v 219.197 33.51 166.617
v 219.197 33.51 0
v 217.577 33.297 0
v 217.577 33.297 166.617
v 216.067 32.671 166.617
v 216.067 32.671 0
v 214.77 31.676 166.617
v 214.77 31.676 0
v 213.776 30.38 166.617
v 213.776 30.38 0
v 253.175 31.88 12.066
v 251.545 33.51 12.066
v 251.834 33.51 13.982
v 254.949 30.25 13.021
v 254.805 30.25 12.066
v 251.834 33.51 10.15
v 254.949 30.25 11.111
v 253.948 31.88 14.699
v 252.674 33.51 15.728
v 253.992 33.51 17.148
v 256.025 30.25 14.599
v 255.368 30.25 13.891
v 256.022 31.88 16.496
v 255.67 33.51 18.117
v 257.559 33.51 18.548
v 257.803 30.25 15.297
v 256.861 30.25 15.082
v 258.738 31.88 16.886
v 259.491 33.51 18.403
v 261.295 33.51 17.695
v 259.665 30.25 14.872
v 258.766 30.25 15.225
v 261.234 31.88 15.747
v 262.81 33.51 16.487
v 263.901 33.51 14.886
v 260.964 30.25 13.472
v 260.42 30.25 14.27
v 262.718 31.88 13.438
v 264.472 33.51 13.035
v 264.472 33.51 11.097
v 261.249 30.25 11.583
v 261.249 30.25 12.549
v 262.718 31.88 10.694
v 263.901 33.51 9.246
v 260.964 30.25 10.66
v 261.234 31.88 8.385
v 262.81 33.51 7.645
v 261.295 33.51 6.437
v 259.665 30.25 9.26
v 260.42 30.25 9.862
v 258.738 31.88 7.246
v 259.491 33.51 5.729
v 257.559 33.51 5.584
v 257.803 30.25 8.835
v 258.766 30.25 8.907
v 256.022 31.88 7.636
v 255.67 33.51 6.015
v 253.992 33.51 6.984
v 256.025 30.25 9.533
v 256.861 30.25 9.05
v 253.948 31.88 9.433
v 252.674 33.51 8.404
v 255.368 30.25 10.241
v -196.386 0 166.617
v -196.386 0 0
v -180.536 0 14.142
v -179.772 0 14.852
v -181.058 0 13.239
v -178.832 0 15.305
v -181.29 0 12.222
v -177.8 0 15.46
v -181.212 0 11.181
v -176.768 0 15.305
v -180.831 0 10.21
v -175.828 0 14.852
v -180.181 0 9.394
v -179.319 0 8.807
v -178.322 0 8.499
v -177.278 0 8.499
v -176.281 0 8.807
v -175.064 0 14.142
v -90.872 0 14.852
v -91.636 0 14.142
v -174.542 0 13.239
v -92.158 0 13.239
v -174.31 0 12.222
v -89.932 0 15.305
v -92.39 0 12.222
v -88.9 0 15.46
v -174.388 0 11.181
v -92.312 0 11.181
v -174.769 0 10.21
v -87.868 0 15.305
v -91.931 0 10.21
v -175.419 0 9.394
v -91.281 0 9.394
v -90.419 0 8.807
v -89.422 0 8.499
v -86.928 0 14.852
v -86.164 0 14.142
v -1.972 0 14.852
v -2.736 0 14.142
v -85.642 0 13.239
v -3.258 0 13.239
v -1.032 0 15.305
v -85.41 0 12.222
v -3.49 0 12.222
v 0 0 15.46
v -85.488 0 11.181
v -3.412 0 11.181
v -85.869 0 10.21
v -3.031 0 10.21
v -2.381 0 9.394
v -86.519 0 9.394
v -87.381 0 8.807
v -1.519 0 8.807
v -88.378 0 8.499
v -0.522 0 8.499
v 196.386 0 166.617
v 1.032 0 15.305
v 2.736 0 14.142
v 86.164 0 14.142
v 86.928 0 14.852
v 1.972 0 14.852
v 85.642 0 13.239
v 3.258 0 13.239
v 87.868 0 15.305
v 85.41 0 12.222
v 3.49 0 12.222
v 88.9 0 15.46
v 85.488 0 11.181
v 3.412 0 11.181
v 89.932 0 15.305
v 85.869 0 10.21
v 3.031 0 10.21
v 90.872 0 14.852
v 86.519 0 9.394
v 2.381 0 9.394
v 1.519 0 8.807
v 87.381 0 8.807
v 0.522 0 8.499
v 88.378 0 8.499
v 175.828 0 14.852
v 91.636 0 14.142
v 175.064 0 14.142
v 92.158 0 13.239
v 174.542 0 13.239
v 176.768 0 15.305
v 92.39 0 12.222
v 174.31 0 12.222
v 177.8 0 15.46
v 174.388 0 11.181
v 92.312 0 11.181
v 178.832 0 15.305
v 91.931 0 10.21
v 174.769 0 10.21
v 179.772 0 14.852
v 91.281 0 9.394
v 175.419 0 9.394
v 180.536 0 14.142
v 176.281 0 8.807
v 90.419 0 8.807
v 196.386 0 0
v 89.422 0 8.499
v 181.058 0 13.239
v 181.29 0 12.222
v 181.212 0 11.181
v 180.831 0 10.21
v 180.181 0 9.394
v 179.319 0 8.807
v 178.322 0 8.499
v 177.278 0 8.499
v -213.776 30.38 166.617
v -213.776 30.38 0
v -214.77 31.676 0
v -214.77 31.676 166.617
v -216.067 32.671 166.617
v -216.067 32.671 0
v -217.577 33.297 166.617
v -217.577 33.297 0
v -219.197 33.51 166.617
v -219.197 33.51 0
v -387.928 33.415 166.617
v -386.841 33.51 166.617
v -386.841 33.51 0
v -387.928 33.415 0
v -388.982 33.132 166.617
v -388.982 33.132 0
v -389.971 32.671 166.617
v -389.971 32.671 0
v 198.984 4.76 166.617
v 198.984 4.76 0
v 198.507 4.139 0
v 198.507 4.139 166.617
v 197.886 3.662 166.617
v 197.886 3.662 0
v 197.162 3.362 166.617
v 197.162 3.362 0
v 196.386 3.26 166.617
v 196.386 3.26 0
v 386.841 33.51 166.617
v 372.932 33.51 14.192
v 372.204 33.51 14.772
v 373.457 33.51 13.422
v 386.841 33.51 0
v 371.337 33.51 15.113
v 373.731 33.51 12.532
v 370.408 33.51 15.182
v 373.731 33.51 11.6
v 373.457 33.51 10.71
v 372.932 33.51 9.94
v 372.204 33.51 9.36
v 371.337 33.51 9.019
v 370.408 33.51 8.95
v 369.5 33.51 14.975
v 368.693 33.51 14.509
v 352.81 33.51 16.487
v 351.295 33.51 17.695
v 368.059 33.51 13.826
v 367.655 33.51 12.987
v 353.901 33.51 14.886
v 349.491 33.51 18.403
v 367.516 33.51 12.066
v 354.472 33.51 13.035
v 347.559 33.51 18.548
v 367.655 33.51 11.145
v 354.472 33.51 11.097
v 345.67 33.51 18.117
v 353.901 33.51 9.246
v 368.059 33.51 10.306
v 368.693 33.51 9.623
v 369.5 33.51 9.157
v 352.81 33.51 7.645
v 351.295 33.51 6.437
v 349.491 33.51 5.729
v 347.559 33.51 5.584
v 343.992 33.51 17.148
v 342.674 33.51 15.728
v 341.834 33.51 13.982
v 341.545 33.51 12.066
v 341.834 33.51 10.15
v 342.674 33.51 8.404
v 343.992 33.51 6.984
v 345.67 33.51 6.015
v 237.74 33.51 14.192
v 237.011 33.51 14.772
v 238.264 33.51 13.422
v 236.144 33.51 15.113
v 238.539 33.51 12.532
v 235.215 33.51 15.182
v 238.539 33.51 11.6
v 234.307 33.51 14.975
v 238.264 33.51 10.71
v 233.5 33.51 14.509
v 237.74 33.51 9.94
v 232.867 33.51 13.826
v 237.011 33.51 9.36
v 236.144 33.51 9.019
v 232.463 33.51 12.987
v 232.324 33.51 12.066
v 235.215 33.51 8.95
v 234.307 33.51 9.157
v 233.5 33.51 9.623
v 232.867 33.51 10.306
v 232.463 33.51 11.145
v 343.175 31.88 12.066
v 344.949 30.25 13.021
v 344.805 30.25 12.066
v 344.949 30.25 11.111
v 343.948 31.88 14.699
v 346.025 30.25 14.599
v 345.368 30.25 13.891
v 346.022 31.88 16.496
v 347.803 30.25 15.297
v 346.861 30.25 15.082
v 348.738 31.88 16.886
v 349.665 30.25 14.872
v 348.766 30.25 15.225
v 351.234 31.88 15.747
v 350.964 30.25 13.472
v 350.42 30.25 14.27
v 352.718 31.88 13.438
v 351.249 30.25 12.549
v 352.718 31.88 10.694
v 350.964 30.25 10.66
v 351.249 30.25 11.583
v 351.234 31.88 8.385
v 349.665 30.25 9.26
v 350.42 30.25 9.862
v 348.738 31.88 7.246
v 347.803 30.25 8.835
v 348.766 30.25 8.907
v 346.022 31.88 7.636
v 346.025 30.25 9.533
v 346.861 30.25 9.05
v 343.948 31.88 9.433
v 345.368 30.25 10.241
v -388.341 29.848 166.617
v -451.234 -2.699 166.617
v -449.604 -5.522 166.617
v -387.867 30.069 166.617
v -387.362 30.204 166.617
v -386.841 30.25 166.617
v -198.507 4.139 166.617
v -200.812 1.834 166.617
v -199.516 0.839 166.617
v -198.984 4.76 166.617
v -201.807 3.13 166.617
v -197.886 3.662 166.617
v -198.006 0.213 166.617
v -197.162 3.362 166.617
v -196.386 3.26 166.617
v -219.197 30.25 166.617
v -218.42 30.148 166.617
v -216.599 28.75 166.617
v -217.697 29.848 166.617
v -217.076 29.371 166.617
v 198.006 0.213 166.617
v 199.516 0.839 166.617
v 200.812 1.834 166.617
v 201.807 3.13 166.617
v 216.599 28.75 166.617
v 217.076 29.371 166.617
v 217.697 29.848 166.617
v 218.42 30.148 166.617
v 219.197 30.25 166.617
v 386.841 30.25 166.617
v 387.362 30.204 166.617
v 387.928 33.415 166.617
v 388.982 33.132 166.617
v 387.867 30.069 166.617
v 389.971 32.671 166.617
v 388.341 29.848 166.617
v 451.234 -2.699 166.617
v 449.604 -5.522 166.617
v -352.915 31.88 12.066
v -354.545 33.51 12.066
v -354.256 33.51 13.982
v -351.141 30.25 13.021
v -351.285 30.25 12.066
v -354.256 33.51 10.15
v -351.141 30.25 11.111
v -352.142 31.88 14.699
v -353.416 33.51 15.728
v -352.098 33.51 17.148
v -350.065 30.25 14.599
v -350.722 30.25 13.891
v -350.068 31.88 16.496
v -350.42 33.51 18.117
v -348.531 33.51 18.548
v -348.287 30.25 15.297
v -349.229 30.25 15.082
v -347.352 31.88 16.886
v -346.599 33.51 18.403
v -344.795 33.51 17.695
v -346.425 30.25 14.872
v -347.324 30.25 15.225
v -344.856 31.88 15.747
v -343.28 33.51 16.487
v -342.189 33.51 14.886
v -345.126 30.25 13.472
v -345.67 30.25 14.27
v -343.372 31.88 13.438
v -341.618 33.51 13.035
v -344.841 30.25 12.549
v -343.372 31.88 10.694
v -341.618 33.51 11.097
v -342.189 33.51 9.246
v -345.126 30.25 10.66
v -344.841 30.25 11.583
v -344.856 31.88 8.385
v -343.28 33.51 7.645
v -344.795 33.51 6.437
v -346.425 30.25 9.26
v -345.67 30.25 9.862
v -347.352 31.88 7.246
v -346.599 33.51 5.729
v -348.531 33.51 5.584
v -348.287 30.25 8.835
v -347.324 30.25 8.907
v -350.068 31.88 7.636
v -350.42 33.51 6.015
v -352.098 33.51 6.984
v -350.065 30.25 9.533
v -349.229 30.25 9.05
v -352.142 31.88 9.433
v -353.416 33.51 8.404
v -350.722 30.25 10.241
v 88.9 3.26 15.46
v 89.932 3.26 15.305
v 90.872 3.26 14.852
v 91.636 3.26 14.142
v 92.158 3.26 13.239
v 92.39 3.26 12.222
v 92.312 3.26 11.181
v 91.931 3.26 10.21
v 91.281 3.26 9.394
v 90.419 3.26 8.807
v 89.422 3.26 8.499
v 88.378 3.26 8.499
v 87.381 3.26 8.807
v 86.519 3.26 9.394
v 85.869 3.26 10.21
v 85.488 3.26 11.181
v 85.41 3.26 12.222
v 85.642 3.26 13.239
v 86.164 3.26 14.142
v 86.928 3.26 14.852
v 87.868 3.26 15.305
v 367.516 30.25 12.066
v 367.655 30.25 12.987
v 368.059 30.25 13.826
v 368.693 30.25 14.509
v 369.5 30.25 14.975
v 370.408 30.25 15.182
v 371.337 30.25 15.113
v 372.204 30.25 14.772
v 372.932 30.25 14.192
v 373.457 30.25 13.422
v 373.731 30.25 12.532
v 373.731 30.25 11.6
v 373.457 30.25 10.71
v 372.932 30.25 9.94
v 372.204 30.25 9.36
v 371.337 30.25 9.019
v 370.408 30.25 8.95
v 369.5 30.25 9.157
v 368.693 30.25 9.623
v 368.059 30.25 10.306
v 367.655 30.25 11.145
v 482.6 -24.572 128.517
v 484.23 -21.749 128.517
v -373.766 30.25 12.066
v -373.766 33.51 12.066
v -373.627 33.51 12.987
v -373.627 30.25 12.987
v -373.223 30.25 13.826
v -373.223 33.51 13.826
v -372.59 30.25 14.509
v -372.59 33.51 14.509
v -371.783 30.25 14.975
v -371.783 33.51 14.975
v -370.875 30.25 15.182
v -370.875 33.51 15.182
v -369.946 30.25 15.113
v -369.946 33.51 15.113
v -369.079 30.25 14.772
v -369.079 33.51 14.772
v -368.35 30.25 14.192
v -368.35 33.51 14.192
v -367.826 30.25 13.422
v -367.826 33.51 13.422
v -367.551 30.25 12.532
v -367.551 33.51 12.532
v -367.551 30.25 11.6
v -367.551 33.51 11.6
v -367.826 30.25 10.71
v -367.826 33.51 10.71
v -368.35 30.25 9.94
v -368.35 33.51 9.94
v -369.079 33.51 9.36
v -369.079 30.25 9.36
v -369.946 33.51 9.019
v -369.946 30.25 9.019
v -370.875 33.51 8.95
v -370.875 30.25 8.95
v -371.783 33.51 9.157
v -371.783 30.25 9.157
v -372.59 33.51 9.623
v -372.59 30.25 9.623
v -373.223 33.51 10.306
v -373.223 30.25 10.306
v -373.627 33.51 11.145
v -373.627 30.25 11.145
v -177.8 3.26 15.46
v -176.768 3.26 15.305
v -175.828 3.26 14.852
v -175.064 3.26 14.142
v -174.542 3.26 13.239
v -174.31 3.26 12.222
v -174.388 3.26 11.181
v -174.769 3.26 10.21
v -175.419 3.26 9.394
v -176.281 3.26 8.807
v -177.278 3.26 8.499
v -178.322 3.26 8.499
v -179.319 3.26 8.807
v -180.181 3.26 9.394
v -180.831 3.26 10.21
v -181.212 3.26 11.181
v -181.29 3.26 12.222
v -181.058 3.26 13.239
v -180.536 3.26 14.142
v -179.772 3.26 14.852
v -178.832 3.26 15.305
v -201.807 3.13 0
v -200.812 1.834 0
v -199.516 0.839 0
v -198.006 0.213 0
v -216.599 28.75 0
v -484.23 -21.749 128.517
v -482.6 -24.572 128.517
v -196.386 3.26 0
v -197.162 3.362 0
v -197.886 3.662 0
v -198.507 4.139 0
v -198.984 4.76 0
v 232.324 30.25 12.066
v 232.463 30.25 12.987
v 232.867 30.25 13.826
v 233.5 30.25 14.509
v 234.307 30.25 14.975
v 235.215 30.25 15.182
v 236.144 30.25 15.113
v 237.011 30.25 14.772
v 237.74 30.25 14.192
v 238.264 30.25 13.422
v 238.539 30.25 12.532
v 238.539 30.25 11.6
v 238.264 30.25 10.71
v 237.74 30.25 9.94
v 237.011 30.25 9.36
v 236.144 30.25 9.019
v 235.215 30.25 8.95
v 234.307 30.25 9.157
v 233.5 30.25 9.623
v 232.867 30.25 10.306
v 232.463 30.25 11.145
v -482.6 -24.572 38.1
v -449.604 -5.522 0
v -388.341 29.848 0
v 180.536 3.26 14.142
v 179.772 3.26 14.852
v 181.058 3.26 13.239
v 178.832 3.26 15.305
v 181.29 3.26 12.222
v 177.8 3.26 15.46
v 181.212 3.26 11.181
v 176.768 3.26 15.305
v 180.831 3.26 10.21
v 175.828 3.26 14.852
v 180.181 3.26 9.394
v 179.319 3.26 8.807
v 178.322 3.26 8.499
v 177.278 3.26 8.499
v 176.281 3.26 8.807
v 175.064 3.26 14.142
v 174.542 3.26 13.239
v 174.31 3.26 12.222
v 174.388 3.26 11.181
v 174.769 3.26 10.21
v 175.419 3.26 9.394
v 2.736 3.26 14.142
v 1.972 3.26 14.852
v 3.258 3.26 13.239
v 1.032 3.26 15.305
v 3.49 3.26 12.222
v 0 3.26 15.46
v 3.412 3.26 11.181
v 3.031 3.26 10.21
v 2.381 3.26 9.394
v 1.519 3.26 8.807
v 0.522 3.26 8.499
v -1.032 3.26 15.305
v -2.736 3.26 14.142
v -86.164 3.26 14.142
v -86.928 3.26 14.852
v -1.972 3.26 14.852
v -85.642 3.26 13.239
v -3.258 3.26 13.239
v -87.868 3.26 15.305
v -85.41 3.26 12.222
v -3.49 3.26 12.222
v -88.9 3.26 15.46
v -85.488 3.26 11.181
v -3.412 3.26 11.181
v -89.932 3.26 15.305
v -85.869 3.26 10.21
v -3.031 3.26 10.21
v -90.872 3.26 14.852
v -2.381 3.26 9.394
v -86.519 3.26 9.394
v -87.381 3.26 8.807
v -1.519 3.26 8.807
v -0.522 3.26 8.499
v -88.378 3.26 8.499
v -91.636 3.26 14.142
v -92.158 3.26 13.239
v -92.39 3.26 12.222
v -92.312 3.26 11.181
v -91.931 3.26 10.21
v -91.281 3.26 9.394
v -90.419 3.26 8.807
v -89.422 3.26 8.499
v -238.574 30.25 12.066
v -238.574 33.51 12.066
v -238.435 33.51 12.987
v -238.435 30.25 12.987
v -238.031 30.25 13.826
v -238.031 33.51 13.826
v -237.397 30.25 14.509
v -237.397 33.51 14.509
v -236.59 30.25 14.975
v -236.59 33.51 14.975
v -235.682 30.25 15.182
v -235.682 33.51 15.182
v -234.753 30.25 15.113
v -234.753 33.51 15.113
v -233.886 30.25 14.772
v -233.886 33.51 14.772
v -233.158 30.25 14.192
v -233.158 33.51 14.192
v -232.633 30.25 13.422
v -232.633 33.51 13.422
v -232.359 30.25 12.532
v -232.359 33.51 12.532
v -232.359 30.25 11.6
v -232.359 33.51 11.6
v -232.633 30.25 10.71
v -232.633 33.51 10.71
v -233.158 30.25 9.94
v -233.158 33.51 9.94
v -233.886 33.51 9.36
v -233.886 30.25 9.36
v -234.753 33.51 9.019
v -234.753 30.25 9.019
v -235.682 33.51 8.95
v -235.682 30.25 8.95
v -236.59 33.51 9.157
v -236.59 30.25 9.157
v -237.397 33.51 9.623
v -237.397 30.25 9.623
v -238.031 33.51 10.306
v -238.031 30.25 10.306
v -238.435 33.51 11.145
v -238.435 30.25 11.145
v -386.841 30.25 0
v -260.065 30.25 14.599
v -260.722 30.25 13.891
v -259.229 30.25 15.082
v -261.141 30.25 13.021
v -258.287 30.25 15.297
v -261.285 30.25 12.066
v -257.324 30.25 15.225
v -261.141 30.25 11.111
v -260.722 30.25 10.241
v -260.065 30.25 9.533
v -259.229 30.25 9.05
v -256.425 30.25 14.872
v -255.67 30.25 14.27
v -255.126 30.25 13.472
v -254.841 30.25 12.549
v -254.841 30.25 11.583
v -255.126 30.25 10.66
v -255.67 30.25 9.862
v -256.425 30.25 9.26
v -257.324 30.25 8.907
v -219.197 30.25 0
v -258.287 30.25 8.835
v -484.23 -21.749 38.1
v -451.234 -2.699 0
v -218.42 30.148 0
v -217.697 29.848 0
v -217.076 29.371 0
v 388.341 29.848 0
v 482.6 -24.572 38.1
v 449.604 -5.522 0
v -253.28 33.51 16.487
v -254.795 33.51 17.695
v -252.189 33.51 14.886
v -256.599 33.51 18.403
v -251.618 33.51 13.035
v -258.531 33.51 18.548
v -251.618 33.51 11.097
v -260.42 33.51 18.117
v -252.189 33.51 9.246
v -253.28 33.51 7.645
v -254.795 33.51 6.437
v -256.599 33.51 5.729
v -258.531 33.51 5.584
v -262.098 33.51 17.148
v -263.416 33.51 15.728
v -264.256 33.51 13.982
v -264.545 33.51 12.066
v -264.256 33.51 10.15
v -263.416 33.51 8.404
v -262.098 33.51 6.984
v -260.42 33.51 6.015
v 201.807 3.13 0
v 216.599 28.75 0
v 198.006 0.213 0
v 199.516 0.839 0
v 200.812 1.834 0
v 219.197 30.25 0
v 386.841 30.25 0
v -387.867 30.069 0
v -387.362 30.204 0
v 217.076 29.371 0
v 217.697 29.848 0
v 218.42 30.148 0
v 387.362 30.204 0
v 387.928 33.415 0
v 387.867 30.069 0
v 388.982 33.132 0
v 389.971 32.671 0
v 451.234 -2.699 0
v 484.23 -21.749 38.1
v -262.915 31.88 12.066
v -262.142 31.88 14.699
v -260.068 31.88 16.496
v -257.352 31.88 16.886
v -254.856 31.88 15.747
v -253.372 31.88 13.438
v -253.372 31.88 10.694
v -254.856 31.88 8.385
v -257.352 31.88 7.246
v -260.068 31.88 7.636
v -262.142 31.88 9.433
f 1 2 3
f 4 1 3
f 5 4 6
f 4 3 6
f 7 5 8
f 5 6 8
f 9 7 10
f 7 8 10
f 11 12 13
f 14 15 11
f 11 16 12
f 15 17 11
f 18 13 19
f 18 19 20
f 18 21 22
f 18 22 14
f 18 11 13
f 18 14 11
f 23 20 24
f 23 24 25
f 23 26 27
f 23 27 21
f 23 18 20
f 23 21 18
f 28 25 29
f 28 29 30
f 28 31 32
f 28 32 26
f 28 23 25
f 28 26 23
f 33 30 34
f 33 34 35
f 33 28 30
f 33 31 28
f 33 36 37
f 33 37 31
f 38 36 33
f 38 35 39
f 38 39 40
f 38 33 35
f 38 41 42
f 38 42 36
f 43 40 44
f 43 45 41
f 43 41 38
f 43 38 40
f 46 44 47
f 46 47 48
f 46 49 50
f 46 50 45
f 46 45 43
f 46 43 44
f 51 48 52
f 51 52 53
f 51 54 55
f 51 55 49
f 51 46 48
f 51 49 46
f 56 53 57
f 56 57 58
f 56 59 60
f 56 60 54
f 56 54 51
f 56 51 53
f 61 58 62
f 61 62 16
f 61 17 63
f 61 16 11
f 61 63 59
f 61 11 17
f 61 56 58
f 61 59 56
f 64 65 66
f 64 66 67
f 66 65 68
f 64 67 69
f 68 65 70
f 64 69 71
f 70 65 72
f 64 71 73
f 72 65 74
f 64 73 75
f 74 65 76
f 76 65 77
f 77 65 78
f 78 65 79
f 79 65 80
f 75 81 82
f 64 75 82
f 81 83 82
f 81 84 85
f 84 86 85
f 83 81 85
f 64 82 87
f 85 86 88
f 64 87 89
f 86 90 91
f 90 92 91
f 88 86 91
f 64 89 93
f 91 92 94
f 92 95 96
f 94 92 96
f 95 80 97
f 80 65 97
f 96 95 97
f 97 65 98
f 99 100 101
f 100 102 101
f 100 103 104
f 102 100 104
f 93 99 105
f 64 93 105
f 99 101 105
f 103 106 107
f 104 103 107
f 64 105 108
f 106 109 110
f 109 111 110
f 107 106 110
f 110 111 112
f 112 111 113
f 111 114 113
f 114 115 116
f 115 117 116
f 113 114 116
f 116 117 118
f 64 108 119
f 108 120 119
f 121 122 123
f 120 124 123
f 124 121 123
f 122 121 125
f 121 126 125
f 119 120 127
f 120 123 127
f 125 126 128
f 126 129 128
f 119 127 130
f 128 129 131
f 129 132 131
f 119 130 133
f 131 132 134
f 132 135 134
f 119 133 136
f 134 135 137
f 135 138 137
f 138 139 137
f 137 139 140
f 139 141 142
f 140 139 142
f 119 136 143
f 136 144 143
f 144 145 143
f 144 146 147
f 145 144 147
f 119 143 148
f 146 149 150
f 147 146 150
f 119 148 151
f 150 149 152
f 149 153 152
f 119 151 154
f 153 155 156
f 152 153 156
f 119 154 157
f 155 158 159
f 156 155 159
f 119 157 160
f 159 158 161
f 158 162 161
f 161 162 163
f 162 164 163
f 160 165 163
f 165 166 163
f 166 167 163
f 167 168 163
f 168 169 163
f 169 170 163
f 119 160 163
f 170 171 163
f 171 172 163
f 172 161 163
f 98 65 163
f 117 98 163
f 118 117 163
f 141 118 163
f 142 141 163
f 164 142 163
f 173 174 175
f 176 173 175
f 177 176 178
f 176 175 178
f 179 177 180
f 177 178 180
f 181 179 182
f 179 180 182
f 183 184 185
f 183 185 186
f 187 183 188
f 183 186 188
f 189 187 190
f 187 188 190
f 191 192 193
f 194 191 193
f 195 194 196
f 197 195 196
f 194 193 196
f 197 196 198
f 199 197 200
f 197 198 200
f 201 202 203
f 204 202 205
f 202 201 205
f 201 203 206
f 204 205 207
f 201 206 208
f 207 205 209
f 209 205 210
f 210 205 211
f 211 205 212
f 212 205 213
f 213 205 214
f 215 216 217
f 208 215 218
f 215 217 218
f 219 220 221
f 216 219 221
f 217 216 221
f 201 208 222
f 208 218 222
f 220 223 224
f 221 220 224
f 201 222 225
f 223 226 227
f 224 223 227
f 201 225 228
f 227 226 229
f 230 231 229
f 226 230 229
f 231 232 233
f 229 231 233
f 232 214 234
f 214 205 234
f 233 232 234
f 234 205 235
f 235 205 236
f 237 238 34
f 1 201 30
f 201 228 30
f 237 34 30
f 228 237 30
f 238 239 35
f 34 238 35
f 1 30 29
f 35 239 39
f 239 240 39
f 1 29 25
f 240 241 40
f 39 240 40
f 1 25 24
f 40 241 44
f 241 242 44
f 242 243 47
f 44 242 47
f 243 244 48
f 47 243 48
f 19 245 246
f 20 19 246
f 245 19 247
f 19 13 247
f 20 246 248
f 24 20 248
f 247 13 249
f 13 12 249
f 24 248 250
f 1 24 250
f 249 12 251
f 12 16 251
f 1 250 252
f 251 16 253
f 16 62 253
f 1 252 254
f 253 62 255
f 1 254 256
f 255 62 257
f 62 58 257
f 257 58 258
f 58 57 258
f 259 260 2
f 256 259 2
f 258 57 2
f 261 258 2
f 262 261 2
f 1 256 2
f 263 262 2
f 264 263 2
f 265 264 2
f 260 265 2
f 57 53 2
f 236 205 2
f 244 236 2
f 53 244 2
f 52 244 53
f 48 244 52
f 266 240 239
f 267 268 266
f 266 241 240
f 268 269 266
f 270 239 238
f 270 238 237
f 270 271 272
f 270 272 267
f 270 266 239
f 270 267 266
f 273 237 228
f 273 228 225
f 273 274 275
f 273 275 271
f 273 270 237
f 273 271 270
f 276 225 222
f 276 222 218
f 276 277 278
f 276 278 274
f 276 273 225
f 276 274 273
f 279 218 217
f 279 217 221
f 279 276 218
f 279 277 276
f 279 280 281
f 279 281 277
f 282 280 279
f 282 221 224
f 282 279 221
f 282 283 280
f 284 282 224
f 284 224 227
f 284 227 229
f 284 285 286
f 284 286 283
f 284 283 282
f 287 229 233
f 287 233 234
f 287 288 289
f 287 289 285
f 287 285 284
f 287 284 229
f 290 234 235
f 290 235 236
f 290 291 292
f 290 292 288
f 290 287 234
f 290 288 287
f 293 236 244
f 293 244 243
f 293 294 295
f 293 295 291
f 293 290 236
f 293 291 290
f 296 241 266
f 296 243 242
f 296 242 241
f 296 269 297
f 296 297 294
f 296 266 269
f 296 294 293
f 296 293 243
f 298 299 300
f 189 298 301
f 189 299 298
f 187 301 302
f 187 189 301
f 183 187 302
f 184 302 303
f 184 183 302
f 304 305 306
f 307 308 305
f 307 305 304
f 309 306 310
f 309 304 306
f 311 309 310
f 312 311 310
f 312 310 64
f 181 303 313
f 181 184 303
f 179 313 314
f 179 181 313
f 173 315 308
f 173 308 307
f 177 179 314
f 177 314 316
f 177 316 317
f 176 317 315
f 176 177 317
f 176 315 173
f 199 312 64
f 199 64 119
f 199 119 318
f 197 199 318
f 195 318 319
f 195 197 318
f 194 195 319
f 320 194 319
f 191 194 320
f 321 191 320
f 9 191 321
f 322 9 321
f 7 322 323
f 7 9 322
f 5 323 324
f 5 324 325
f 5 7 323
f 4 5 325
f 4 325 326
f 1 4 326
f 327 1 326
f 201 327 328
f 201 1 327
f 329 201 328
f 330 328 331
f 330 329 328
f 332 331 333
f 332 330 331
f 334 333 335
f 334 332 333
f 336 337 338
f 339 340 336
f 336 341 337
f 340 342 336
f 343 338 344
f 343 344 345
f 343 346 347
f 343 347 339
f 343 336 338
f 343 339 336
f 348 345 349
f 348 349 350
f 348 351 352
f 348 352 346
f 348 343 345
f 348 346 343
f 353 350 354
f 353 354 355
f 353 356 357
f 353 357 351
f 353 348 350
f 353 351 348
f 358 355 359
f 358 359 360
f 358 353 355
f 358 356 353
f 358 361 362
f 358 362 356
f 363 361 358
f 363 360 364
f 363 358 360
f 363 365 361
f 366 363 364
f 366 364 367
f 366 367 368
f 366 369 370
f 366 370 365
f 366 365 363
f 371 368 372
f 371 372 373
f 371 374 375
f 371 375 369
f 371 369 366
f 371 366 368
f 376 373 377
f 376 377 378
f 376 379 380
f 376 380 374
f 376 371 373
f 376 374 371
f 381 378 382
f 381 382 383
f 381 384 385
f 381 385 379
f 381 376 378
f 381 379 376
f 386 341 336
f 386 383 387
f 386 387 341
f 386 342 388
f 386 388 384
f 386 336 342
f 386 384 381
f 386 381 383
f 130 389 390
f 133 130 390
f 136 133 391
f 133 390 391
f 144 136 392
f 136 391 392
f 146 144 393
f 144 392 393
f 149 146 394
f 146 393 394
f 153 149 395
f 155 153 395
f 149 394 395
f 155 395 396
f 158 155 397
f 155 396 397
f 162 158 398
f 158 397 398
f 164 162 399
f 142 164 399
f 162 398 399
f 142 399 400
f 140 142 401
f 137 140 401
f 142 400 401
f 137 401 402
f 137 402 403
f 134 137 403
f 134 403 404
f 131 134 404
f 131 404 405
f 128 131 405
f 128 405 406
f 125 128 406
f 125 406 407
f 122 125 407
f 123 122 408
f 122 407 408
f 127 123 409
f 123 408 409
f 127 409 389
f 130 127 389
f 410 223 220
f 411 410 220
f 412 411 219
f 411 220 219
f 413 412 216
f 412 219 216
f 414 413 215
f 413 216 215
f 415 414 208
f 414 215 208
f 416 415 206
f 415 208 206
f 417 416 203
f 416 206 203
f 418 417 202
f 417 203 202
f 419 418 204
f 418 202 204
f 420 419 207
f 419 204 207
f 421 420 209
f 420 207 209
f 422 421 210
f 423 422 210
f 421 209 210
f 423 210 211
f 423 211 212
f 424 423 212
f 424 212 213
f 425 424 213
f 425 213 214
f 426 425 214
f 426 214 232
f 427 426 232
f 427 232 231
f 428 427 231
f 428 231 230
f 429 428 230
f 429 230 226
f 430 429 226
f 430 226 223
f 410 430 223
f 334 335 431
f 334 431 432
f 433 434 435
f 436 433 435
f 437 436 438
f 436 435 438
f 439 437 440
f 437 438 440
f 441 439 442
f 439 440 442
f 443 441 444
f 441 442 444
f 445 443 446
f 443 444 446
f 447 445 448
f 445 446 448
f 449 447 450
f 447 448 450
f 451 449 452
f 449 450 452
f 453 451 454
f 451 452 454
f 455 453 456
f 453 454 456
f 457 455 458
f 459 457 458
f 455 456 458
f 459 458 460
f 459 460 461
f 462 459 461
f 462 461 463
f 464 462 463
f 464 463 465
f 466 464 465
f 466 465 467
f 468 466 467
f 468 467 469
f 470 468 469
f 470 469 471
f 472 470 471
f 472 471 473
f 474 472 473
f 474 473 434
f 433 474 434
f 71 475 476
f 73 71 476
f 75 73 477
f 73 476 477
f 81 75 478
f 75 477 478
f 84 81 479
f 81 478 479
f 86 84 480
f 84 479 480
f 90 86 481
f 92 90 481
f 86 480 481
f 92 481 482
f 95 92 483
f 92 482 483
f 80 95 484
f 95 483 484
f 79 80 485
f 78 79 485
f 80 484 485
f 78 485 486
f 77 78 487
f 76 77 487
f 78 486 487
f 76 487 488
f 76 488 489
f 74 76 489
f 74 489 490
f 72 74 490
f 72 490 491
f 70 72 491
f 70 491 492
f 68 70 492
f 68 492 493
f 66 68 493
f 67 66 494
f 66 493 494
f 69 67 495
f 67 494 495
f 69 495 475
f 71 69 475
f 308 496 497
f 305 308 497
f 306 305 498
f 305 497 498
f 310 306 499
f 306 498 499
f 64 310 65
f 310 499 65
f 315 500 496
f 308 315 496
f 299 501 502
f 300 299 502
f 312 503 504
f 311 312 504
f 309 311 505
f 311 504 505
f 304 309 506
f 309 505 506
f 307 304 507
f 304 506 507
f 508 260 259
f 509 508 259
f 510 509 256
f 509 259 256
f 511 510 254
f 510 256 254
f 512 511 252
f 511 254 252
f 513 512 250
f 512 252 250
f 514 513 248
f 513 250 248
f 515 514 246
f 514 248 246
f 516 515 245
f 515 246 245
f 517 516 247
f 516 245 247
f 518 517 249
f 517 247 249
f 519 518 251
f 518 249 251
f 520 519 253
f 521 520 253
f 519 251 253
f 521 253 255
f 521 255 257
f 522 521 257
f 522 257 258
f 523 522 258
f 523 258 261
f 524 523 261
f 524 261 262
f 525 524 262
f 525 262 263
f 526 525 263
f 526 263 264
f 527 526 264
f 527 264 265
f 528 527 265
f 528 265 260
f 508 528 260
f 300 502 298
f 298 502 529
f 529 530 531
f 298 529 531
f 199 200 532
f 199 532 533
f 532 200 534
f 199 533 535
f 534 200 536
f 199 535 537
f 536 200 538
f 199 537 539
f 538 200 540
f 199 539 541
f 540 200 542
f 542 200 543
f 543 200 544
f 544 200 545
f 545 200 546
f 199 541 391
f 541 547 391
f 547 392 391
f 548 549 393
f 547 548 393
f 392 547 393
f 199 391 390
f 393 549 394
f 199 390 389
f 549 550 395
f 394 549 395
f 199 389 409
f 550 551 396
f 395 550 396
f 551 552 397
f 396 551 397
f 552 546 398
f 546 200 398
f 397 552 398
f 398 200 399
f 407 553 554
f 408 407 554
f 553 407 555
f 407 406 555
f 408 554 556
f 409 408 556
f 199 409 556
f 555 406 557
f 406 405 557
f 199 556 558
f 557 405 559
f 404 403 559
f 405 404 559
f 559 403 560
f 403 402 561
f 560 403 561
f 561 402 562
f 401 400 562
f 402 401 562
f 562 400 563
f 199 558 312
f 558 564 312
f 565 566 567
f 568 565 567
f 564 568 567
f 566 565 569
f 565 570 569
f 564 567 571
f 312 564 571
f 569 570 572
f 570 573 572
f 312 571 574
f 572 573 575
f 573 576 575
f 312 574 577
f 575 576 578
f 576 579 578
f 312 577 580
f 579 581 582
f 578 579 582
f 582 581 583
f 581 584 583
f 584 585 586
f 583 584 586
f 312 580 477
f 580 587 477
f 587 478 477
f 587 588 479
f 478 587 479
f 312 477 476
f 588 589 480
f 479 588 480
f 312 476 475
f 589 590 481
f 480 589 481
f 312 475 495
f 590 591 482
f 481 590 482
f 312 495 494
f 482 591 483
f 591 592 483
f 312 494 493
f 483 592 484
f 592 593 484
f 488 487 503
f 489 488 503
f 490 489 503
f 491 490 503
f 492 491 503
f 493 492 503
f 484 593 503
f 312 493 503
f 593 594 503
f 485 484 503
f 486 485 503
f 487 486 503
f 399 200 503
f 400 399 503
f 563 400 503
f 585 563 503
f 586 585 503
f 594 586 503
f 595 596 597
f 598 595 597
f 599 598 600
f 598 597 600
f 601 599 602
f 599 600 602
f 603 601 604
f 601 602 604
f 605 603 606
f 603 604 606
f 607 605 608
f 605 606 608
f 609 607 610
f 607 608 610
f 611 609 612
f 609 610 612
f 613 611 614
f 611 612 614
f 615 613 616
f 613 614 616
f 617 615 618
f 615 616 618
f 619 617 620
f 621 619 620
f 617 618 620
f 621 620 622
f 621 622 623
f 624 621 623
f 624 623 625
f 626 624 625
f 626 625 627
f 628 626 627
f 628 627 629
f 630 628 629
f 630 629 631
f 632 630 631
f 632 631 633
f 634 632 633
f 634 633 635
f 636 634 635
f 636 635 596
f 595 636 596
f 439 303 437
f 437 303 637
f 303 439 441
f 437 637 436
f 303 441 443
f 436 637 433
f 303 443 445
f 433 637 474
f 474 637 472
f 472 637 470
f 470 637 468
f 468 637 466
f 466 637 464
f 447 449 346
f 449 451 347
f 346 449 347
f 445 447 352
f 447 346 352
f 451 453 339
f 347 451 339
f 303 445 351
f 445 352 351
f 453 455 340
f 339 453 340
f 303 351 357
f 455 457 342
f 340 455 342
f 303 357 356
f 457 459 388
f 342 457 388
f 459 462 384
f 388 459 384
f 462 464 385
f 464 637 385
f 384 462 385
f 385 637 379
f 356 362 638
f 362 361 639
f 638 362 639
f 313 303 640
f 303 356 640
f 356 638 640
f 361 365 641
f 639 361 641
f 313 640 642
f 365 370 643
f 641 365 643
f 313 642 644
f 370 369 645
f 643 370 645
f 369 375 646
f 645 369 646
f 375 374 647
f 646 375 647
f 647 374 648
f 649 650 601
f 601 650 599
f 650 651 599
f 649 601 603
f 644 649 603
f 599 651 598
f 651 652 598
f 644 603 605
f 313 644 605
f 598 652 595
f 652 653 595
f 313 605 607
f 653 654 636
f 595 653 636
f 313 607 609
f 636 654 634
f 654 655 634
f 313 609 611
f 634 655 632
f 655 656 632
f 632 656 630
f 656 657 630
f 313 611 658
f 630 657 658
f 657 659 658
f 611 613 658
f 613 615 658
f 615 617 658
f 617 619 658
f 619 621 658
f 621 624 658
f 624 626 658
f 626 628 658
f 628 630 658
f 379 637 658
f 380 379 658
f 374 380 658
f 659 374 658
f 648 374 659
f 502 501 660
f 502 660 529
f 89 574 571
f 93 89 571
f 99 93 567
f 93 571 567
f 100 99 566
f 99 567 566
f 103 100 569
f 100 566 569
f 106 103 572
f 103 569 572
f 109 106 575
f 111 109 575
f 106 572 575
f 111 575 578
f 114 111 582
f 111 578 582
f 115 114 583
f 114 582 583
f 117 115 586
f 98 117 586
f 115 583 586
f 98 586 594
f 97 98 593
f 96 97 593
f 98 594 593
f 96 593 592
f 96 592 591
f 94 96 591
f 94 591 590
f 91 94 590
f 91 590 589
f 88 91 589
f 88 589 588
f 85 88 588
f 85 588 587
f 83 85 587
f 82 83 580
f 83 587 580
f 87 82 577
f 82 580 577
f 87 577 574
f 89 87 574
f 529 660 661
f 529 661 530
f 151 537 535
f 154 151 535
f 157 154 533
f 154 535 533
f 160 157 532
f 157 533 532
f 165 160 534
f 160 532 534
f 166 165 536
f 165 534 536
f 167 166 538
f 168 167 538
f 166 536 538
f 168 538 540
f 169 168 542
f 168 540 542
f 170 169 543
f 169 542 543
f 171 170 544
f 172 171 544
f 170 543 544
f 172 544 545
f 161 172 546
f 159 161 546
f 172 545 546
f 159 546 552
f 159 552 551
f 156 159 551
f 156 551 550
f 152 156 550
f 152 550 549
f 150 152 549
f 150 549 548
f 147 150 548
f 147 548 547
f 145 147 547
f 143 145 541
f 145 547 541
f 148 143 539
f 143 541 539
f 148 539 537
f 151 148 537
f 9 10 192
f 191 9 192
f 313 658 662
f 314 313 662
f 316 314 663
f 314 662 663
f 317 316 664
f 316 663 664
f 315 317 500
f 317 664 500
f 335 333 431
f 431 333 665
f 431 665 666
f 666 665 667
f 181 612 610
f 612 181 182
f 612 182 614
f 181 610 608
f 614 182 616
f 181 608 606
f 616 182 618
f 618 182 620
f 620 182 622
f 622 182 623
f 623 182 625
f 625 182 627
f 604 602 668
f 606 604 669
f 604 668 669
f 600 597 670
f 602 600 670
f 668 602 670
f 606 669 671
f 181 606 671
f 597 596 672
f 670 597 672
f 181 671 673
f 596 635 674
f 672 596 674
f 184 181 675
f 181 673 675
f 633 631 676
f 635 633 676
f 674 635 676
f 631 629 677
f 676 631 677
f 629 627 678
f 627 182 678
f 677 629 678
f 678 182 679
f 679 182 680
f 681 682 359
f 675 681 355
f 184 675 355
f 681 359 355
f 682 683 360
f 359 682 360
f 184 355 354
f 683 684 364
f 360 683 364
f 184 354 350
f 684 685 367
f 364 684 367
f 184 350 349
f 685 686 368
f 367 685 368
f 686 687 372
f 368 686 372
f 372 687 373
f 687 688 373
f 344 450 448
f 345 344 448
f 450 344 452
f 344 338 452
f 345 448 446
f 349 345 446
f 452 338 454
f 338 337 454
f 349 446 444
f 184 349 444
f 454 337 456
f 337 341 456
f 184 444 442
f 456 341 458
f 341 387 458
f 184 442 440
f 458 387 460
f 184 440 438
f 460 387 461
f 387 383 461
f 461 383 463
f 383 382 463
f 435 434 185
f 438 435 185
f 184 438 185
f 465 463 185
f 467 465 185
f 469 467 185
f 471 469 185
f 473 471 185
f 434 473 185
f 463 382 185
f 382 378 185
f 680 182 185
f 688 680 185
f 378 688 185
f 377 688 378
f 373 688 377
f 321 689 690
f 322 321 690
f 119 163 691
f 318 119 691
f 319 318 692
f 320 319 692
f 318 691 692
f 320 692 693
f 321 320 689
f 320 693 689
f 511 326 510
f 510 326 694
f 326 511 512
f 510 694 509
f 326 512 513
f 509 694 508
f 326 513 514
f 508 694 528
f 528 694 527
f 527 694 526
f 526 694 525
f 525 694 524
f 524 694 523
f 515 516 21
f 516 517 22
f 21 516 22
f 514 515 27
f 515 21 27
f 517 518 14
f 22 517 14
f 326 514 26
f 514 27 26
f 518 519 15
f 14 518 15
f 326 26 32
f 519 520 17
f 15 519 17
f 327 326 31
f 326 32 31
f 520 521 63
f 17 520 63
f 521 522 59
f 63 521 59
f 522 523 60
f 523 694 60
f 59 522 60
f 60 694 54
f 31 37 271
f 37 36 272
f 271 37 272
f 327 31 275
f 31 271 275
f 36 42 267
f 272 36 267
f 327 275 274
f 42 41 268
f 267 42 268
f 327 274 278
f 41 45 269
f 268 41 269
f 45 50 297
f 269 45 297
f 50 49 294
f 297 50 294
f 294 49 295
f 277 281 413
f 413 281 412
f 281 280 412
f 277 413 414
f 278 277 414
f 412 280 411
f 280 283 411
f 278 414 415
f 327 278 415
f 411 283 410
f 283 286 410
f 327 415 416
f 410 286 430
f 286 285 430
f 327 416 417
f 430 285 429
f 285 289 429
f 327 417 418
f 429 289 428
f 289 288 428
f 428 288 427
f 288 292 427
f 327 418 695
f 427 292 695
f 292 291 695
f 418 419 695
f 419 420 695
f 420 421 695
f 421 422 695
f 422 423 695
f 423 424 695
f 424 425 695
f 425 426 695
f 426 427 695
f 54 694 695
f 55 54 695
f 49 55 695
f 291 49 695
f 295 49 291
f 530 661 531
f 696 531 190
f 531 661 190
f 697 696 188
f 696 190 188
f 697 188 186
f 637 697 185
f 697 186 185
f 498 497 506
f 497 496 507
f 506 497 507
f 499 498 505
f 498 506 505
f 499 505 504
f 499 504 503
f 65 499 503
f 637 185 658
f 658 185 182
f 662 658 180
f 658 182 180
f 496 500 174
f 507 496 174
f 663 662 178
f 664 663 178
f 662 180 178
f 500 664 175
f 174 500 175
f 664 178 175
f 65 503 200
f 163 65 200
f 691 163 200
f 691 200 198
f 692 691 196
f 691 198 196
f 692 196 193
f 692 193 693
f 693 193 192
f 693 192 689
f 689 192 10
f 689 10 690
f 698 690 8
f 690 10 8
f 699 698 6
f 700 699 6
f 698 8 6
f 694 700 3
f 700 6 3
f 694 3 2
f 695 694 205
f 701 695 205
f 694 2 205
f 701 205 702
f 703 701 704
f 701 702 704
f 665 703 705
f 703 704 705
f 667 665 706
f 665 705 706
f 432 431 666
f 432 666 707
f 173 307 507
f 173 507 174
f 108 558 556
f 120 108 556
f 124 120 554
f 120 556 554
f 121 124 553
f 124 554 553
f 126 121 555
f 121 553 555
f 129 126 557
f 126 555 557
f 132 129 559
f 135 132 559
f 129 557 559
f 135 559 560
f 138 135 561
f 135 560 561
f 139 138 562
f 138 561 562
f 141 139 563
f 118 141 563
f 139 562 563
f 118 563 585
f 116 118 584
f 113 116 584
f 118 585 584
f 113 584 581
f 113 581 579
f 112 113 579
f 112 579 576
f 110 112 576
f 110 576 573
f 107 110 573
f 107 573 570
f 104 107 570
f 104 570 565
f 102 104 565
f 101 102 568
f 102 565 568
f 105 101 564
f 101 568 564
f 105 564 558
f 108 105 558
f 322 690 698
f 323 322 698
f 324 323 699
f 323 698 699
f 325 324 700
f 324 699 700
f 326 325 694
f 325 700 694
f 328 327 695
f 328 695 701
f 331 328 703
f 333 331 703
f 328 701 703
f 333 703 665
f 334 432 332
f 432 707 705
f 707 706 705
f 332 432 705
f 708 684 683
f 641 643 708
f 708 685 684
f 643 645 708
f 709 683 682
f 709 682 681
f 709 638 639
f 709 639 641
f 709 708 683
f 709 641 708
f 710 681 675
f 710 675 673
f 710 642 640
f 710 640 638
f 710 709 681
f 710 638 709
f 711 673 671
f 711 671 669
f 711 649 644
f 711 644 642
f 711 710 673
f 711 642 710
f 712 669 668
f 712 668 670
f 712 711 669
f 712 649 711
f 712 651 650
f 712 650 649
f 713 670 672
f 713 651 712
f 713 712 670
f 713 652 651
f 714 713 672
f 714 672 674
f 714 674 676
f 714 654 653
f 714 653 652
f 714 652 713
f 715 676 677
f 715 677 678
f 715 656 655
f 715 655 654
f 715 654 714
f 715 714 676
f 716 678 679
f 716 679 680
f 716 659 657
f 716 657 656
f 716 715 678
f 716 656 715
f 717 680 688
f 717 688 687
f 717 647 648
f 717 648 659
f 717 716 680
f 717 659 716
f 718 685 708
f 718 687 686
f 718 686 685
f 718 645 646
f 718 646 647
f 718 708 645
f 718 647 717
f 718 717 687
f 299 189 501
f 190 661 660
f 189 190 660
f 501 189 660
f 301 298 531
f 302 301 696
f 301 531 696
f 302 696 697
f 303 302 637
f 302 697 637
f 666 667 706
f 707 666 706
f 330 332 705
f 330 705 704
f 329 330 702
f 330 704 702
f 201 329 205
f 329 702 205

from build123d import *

# Parameters (mm, degrees)
BASE_FLANGE1_DEPTH = 166.61684
SKETCH2_R          = 3.5
CUT_EXTRUDE1_DEPTH = 3.26
CHAMFER1_SIZE      = 38.1
SKETCH3_R          = 3
CUT_EXTRUDE2_DEPTH = 3.26
SKETCH8_R          = 3.125
CUT_EXTRUDE7_DEPTH = 10
CHAMFER2_SIZE      = 3.5


# Sheet-metal steps are written as plain solids
with BuildPart() as part:
    # Sketch1 → Base-Flange1 (new body)
    with BuildSketch(Plane.XY):
        with BuildLine():
            Line((-482.6, -24.572383929), (-388.340998066, 29.848076211))
            ThreePointArc((-388.340998066, 29.848076211), (-387.617455201, 30.147777479), (-386.840998066, 30.25))
            Line((-386.840998066, 30.25), (-219.196896451, 30.25))
            ThreePointArc((-219.196896451, 30.25), (-217.696896451, 29.848076211), (-216.598820239, 28.75))
            Line((-216.598820239, 28.75), (-201.807106343, 3.13))
            ThreePointArc((-201.807106343, 3.13), (-199.515787315, 0.838680972), (-196.385787315, 0))
            Line((-196.385787315, 0), (196.385787315, 0))
            ThreePointArc((196.385787315, 0), (199.515787315, 0.838680972), (201.807106343, 3.13))
            Line((201.807106343, 3.13), (216.598820239, 28.75))
            ThreePointArc((216.598820239, 28.75), (217.696896451, 29.848076211), (219.196896451, 30.25))
            Line((219.196896451, 30.25), (386.840998066, 30.25))
            ThreePointArc((386.840998066, 30.25), (387.617455201, 30.147777479), (388.340998066, 29.848076211))
            Line((388.340998066, 29.848076211), (482.6, -24.572383929))
            Line((482.6, -24.572383929), (484.23, -21.749141113))
            Line((484.23, -21.749141113), (389.970998066, 32.671319028))
            ThreePointArc((389.970998066, 32.671319028), (388.461205288, 33.296695673), (386.840998066, 33.51))
            Line((386.840998066, 33.51), (219.196896451, 33.51))
            ThreePointArc((219.196896451, 33.51), (216.066896451, 32.671319028), (213.775577423, 30.38))
            Line((213.775577423, 30.38), (198.983863526, 4.76))
            ThreePointArc((198.983863526, 4.76), (197.885787315, 3.661923789), (196.385787315, 3.26))
            Line((196.385787315, 3.26), (-196.385787315, 3.26))
            ThreePointArc((-196.385787315, 3.26), (-197.885787315, 3.661923789), (-198.983863526, 4.76))
            Line((-198.983863526, 4.76), (-213.775577423, 30.38))
            ThreePointArc((-213.775577423, 30.38), (-216.066896451, 32.671319028), (-219.196896451, 33.51))
            Line((-219.196896451, 33.51), (-386.840998066, 33.51))
            ThreePointArc((-386.840998066, 33.51), (-388.461205288, 33.296695673), (-389.970998066, 32.671319028))
            Line((-389.970998066, 32.671319028), (-484.23, -21.749141113))
            Line((-484.23, -21.749141113), (-482.6, -24.572383929))
        make_face()
    extrude(amount=BASE_FLANGE1_DEPTH)

    # Sketch2 → Cut-Extrude1 (cut)
    with BuildSketch(Plane(origin=(0, 3.26, 0), x_dir=(1, 0, 0), z_dir=(0, 1, 0))):
        with Locations(Location((0, -11.96, 0), (0, 0, 270))):
            Circle(SKETCH2_R)
        with Locations(Location((-177.8, -11.96, 0), (0, 0, 270))):
            Circle(SKETCH2_R)
        with Locations(Location((-88.9, -11.96, 0), (0, 0, 270))):
            Circle(SKETCH2_R)
        with Locations(Location((88.9, -11.96, 0), (0, 0, 270))):
            Circle(SKETCH2_R)
        with Locations(Location((177.8, -11.96, 0), (0, 0, 270))):
            Circle(SKETCH2_R)
    extrude(amount=-CUT_EXTRUDE1_DEPTH, mode=Mode.SUBTRACT)

    # Chamfer1
    chamfer1_edges = [part.edges().sort_by_distance(p)[0] for p in [
        (-483.415, -23.160762521, 166.61684),
        (-483.415, -23.160762521, 0),
        (483.415, -23.160762521, 0),
        (483.415, -23.160762521, 166.61684),
    ]]
    chamfer(chamfer1_edges, length=CHAMFER1_SIZE)

    # Sketch3 → Cut-Extrude2 (cut)
    with BuildSketch(Plane(origin=(0, 33.51, 0), x_dir=(1, 0, 0), z_dir=(0, 1, 0))):
        with Locations(Location((-258.045033443, -12.066000028, 0), (0, 0, 180))):
            Circle(SKETCH3_R)
        with Locations(Location((-348.045033443, -12.066000028, 0), (0, 0, 180))):
            Circle(SKETCH3_R)
        with Locations(Location((258.045033443, -12.066000028, 0), (0, 0, 180))):
            Circle(SKETCH3_R)
        with Locations(Location((348.045033443, -12.066000028, 0), (0, 0, 180))):
            Circle(SKETCH3_R)
    extrude(amount=-CUT_EXTRUDE2_DEPTH, mode=Mode.SUBTRACT)

    # Sketch8 → Cut-Extrude7 (cut)
    with BuildSketch(Plane(origin=(0, 33.51, 0), x_dir=(1, 0, 0), z_dir=(0, 1, 0))):
        with Locations(Location((235.448800169, -12.066000028, 0), (0, 0, 180))):
            Circle(SKETCH8_R)
        with Locations(Location((370.641266718, -12.066000028, 0), (0, 0, 180))):
            Circle(SKETCH8_R)
        with Locations(Location((-370.641266718, -12.066000028, 0), (0, 0, 180))):
            Circle(SKETCH8_R)
        with Locations(Location((-235.448800169, -12.066000028, 0), (0, 0, 180))):
            Circle(SKETCH8_R)
    extrude(amount=-CUT_EXTRUDE7_DEPTH, mode=Mode.SUBTRACT)

    # Chamfer2
    # the kernel refuses this chamfer: 3.5 mm, written as the material it takes off along each edge
    with BuildSketch(Plane(origin=(-348.045033443, 33.51, 12.066000028), x_dir=(-1, 0, 0), z_dir=(0, 0, -1))) as chamfer2_piece_1:
        Polygon((3 + CHAMFER2_SIZE, 0), (3, -CHAMFER2_SIZE), (3, 0), align=None)
    revolve(axis=Axis((-348.045033443, 33.51, 12.066000028), (0, 1, 0)), mode=Mode.SUBTRACT)
    with BuildSketch(Plane(origin=(-258.045033443, 33.51, 12.066000028), x_dir=(-1, 0, 0), z_dir=(0, 0, -1))) as chamfer2_piece_2:
        Polygon((3 + CHAMFER2_SIZE, 0), (3, -CHAMFER2_SIZE), (3, 0), align=None)
    revolve(axis=Axis((-258.045033443, 33.51, 12.066000028), (0, 1, 0)), mode=Mode.SUBTRACT)
    with BuildSketch(Plane(origin=(348.045033443, 33.51, 12.066000028), x_dir=(-1, 0, 0), z_dir=(0, 0, -1))) as chamfer2_piece_3:
        Polygon((3 + CHAMFER2_SIZE, 0), (3, -CHAMFER2_SIZE), (3, 0), align=None)
    revolve(axis=Axis((348.045033443, 33.51, 12.066000028), (0, 1, 0)), mode=Mode.SUBTRACT)
    with BuildSketch(Plane(origin=(258.045033443, 33.51, 12.066000028), x_dir=(-1, 0, 0), z_dir=(0, 0, -1))) as chamfer2_piece_4:
        Polygon((3 + CHAMFER2_SIZE, 0), (3, -CHAMFER2_SIZE), (3, 0), align=None)
    revolve(axis=Axis((258.045033443, 33.51, 12.066000028), (0, 1, 0)), mode=Mode.SUBTRACT)


solid = part.part
